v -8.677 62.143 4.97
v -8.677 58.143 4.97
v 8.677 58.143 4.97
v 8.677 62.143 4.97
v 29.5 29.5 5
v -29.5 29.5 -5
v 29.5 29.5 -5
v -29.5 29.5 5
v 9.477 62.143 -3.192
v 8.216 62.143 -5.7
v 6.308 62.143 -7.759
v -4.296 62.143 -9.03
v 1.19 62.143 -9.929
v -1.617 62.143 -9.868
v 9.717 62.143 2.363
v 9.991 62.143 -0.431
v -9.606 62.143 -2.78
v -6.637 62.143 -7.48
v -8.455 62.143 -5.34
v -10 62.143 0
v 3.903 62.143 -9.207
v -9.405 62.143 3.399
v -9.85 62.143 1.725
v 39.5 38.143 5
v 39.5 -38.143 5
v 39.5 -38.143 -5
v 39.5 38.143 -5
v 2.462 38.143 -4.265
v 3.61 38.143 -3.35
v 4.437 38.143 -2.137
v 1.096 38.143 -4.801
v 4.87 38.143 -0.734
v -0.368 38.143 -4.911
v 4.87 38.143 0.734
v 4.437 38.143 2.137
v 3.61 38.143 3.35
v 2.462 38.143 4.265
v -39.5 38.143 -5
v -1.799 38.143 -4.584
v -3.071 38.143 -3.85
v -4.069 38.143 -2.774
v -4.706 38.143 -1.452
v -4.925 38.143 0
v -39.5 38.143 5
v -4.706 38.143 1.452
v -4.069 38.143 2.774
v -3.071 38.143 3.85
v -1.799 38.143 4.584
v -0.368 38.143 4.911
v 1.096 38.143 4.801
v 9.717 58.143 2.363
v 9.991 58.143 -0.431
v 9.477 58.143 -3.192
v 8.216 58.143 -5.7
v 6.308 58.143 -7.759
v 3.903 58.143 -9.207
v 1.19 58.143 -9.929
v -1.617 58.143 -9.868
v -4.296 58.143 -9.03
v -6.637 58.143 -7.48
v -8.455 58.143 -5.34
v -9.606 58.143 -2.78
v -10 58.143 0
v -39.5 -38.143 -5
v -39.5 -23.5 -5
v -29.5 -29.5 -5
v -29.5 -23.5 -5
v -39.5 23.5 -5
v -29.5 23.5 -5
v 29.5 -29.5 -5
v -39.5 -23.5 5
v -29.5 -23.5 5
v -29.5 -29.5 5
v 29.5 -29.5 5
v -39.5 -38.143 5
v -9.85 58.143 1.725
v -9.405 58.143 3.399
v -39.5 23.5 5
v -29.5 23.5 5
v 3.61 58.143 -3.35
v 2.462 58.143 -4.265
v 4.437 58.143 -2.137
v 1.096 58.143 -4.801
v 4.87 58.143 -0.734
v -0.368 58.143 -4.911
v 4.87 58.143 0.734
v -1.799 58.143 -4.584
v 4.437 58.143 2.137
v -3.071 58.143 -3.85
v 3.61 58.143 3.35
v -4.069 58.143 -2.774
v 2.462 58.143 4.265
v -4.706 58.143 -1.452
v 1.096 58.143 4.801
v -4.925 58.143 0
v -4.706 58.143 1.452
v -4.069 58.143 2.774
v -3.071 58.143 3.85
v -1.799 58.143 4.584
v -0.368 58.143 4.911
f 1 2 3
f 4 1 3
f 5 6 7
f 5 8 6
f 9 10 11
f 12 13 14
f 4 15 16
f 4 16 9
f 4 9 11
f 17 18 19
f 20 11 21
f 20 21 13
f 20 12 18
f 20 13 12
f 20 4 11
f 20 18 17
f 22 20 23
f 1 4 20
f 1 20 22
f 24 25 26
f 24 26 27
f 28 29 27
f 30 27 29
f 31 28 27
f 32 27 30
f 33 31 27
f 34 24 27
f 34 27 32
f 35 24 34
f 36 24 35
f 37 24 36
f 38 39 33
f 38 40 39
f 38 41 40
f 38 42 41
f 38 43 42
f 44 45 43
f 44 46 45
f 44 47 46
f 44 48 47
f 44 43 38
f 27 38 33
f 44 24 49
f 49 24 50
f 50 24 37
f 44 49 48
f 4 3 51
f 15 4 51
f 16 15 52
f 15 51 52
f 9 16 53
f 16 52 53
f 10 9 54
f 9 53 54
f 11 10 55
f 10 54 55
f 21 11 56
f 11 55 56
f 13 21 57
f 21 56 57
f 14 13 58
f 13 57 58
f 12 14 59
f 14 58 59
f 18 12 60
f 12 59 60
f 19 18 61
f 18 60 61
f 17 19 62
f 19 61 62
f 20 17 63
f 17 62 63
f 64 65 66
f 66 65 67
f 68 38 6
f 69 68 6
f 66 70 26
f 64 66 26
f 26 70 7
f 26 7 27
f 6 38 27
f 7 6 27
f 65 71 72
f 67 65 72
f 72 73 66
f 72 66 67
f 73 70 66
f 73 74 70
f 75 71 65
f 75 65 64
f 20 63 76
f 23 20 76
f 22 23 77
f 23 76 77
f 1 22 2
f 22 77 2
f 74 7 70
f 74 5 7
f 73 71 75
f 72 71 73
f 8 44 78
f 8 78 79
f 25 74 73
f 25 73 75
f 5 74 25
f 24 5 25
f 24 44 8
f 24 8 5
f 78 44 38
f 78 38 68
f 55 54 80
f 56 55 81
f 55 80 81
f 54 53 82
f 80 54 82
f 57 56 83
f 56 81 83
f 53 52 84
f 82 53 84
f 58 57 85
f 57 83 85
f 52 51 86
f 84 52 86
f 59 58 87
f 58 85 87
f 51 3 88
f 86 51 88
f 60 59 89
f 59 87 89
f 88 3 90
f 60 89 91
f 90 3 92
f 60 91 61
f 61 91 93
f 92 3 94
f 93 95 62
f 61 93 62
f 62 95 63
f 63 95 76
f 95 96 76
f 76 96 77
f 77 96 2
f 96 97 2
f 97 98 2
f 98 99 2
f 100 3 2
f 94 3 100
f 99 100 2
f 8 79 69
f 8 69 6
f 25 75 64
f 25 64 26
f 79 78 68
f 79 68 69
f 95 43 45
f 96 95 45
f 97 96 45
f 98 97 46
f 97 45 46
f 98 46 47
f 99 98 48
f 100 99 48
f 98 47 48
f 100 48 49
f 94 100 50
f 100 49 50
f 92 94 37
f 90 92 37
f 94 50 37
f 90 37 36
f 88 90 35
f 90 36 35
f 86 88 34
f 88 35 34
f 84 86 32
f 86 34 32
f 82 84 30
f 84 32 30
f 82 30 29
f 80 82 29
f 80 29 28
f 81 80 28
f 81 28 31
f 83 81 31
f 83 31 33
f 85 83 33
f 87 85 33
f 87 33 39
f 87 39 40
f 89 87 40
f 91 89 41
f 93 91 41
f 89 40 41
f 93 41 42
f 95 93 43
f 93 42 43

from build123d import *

# Parameters (mm, degrees)
F0_W     = 10
F0_H     = 6
F1_DEPTH = 5
F2_R     = 4.9247083424
F3_DEPTH = 20
F4_R     = 4.9247083424
F5_DEPTH = 4


with BuildPart() as f1:
    # F0 (on Top) → F1 (new body, symmetric)
    with BuildSketch(Plane.XY):
        Polygon((29.5, -29.5), (-29.5, -29.5), (-39.5, -29.5), (-39.5, -38.1432852078), (39.5, -38.1432852078), (39.5, 38.1432852078), (-39.5, 38.1432852078), (-39.5, 23.5), (-29.5, 23.5), (-29.5, 29.5), (29.5, 29.5), align=None)
        with Locations((-34.5, -26.5)):
            Rectangle(F0_W, F0_H)
    extrude(amount=F1_DEPTH, both=True)

    # F2 (on face) → F3 (join)
    with BuildSketch(Plane(origin=(0, 38.1432852078, 0), x_dir=(-1, 0, 0), z_dir=(0, 1, 0))):
        Circle(F2_R)
    extrude(amount=F3_DEPTH)

    # F4 (on face) → F5 (join)
    with BuildSketch(Plane(origin=(0, 58.1432852078, 0), x_dir=(-1, 0, 0), z_dir=(0, 1, 0))):
        with BuildLine():
            ThreePointArc((-8.6772361623, 4.9704700566), (-2.5717346653, -9.6636525606), (10, 0))
            ThreePointArc((10, 0), (9.6636525606, 2.5717346653), (8.6772361623, 4.9704700566))
            Line((8.6772361623, 4.9704700566), (-8.6772361623, 4.9704700566))
        make_face()
        Circle(F4_R, mode=Mode.SUBTRACT)
        Circle(F4_R)
    extrude(amount=F5_DEPTH)


solid = f1.part
